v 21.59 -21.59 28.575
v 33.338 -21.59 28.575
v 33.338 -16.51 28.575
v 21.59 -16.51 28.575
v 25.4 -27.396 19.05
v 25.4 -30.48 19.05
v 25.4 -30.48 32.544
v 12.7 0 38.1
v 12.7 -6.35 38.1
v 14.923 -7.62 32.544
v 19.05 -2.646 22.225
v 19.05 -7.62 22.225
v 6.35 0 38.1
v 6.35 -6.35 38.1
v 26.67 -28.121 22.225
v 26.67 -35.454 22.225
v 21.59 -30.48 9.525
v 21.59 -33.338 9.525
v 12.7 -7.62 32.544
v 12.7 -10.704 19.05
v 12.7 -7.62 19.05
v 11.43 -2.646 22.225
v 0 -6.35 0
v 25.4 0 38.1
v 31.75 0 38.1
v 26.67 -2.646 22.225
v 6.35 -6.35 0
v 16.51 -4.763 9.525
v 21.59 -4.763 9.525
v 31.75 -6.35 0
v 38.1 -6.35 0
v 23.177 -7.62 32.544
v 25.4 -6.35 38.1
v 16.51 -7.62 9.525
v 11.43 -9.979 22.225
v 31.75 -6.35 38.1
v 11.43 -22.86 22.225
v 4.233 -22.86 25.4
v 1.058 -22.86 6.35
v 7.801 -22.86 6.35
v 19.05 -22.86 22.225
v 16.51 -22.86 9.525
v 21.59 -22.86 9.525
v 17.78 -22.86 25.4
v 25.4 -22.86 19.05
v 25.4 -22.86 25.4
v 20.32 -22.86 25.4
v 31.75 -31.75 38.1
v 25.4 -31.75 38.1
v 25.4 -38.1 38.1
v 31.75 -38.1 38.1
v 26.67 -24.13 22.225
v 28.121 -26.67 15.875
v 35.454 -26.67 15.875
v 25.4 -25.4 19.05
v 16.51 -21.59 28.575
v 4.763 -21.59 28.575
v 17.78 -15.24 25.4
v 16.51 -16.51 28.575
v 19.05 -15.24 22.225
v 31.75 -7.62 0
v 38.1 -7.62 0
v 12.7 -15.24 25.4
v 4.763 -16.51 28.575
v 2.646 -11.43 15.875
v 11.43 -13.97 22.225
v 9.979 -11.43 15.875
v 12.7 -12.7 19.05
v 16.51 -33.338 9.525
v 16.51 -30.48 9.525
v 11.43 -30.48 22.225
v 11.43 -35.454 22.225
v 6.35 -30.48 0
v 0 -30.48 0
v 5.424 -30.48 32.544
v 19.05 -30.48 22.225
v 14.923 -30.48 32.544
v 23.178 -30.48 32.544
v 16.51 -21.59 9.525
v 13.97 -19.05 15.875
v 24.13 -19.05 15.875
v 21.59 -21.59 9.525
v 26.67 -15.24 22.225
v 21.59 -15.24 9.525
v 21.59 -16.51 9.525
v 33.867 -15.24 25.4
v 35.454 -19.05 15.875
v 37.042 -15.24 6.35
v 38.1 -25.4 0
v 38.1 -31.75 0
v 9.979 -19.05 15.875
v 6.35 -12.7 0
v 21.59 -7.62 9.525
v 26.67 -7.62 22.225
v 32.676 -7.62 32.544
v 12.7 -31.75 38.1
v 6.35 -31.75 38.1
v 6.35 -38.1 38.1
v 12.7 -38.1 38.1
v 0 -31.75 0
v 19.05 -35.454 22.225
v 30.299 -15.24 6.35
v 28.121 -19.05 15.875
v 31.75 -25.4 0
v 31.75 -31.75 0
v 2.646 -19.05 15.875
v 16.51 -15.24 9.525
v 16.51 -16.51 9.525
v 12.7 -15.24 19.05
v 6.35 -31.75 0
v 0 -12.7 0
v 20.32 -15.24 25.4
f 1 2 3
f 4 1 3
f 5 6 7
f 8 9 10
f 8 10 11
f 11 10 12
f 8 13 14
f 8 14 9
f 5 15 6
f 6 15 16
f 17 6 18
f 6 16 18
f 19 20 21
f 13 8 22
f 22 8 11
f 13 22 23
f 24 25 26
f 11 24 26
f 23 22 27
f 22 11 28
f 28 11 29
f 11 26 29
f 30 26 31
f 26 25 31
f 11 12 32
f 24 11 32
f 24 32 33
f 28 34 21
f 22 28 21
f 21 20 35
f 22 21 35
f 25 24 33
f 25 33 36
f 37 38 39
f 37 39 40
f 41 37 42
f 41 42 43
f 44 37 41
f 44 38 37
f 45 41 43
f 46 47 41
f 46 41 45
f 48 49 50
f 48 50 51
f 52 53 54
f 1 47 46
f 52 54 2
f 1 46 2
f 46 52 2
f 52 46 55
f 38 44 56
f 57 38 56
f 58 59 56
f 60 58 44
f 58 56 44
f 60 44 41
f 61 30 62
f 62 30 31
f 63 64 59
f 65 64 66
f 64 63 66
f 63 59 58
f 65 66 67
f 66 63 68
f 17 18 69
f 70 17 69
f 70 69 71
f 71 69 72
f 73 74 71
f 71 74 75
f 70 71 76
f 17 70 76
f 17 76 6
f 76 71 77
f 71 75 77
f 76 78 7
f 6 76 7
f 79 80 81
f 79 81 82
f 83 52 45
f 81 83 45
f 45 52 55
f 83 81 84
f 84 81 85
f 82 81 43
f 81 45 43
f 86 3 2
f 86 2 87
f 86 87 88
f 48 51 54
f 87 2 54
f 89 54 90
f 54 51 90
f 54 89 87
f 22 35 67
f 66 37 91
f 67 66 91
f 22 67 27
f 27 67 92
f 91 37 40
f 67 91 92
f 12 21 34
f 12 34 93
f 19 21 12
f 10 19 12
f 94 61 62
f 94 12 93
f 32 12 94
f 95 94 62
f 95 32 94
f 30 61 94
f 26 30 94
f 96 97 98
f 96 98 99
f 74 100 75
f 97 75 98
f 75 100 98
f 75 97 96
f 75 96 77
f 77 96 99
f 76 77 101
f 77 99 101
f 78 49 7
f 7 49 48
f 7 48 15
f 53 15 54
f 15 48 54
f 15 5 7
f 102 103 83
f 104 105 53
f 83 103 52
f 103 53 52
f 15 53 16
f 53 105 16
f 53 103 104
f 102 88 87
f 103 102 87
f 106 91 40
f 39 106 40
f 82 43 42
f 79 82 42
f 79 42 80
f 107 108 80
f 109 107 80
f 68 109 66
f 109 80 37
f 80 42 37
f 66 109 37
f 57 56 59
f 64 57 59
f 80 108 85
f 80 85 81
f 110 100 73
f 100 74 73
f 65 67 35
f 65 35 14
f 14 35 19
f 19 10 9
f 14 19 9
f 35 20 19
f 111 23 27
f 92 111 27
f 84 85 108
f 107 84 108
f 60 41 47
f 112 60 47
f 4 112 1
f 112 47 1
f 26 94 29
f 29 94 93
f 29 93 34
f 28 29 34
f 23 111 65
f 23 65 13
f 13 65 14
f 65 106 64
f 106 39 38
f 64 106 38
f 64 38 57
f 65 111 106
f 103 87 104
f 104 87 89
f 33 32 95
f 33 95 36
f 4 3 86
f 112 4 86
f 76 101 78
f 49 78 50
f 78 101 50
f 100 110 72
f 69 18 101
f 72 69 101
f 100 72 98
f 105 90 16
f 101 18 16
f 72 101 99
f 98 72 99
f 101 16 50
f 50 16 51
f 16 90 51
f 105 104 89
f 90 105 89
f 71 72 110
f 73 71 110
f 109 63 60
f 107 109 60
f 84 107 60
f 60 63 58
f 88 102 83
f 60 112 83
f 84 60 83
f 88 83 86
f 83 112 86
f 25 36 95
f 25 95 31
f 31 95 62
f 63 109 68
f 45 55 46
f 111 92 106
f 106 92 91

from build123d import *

# Parameters (mm, degrees)
F0_W      = 38.1
F0_H      = 38.1
F6_DEPTH  = 38.1
F7_DEPTH  = 38.1
F8_DEPTH  = 38.1
F9_W      = 25.4
F9_H      = 7.62
F10_DEPTH = 38.1


with BuildPart() as f6:
    # F0 (on Front) → F6 (new body)
    with BuildSketch(Plane.XZ):
        with Locations((19.05, 19.05)):
            Rectangle(F0_W, F0_H)
    extrude(amount=F6_DEPTH)

    # F4 (on offset) → F7 (cut)
    with BuildSketch(Plane.YZ.offset(38.1)):
        Polygon((-31.75, 0), (-38.1, 38.1), (-38.1, 0), align=None)
        Polygon((-6.35, 38.1), (-31.75, 38.1), (-26.67, 15.875), (-21.59, 28.575), (-16.51, 28.575), (-11.43, 15.875), align=None)
        Polygon((-19.05, 15.875), (-25.4, 0), (-12.7, 0), align=None)
        Polygon((0, 0), (0, 38.1), (-6.35, 0), align=None)
    extrude(amount=-F7_DEPTH, mode=Mode.SUBTRACT)

    # F5 (on offset) → F8 (cut)
    with BuildSketch(Plane.XZ.offset(38.1)):
        Polygon((0, 38.1), (0, 0), (6.35, 38.1), align=None)
        Polygon((25.4, 38.1), (12.7, 38.1), (19.05, 22.225), align=None)
        Polygon((31.75, 38.1), (38.1, 0), (38.1, 38.1), align=None)
        Polygon((11.43, 22.225), (6.35, 0), (31.75, 0), (26.67, 22.225), (21.59, 9.525), (16.51, 9.525), align=None)
    extrude(amount=-F8_DEPTH, mode=Mode.SUBTRACT)

    # F9 (on offset) → F10 (cut)
    with BuildSketch(Plane.XY.offset(38.1)):
        with Locations((25.4, -11.43)):
            Rectangle(F9_W, F9_H)
        with Locations((12.7, -26.67)):
            Rectangle(F9_W, F9_H)
    extrude(amount=-F10_DEPTH, mode=Mode.SUBTRACT)


solid = f6.part
